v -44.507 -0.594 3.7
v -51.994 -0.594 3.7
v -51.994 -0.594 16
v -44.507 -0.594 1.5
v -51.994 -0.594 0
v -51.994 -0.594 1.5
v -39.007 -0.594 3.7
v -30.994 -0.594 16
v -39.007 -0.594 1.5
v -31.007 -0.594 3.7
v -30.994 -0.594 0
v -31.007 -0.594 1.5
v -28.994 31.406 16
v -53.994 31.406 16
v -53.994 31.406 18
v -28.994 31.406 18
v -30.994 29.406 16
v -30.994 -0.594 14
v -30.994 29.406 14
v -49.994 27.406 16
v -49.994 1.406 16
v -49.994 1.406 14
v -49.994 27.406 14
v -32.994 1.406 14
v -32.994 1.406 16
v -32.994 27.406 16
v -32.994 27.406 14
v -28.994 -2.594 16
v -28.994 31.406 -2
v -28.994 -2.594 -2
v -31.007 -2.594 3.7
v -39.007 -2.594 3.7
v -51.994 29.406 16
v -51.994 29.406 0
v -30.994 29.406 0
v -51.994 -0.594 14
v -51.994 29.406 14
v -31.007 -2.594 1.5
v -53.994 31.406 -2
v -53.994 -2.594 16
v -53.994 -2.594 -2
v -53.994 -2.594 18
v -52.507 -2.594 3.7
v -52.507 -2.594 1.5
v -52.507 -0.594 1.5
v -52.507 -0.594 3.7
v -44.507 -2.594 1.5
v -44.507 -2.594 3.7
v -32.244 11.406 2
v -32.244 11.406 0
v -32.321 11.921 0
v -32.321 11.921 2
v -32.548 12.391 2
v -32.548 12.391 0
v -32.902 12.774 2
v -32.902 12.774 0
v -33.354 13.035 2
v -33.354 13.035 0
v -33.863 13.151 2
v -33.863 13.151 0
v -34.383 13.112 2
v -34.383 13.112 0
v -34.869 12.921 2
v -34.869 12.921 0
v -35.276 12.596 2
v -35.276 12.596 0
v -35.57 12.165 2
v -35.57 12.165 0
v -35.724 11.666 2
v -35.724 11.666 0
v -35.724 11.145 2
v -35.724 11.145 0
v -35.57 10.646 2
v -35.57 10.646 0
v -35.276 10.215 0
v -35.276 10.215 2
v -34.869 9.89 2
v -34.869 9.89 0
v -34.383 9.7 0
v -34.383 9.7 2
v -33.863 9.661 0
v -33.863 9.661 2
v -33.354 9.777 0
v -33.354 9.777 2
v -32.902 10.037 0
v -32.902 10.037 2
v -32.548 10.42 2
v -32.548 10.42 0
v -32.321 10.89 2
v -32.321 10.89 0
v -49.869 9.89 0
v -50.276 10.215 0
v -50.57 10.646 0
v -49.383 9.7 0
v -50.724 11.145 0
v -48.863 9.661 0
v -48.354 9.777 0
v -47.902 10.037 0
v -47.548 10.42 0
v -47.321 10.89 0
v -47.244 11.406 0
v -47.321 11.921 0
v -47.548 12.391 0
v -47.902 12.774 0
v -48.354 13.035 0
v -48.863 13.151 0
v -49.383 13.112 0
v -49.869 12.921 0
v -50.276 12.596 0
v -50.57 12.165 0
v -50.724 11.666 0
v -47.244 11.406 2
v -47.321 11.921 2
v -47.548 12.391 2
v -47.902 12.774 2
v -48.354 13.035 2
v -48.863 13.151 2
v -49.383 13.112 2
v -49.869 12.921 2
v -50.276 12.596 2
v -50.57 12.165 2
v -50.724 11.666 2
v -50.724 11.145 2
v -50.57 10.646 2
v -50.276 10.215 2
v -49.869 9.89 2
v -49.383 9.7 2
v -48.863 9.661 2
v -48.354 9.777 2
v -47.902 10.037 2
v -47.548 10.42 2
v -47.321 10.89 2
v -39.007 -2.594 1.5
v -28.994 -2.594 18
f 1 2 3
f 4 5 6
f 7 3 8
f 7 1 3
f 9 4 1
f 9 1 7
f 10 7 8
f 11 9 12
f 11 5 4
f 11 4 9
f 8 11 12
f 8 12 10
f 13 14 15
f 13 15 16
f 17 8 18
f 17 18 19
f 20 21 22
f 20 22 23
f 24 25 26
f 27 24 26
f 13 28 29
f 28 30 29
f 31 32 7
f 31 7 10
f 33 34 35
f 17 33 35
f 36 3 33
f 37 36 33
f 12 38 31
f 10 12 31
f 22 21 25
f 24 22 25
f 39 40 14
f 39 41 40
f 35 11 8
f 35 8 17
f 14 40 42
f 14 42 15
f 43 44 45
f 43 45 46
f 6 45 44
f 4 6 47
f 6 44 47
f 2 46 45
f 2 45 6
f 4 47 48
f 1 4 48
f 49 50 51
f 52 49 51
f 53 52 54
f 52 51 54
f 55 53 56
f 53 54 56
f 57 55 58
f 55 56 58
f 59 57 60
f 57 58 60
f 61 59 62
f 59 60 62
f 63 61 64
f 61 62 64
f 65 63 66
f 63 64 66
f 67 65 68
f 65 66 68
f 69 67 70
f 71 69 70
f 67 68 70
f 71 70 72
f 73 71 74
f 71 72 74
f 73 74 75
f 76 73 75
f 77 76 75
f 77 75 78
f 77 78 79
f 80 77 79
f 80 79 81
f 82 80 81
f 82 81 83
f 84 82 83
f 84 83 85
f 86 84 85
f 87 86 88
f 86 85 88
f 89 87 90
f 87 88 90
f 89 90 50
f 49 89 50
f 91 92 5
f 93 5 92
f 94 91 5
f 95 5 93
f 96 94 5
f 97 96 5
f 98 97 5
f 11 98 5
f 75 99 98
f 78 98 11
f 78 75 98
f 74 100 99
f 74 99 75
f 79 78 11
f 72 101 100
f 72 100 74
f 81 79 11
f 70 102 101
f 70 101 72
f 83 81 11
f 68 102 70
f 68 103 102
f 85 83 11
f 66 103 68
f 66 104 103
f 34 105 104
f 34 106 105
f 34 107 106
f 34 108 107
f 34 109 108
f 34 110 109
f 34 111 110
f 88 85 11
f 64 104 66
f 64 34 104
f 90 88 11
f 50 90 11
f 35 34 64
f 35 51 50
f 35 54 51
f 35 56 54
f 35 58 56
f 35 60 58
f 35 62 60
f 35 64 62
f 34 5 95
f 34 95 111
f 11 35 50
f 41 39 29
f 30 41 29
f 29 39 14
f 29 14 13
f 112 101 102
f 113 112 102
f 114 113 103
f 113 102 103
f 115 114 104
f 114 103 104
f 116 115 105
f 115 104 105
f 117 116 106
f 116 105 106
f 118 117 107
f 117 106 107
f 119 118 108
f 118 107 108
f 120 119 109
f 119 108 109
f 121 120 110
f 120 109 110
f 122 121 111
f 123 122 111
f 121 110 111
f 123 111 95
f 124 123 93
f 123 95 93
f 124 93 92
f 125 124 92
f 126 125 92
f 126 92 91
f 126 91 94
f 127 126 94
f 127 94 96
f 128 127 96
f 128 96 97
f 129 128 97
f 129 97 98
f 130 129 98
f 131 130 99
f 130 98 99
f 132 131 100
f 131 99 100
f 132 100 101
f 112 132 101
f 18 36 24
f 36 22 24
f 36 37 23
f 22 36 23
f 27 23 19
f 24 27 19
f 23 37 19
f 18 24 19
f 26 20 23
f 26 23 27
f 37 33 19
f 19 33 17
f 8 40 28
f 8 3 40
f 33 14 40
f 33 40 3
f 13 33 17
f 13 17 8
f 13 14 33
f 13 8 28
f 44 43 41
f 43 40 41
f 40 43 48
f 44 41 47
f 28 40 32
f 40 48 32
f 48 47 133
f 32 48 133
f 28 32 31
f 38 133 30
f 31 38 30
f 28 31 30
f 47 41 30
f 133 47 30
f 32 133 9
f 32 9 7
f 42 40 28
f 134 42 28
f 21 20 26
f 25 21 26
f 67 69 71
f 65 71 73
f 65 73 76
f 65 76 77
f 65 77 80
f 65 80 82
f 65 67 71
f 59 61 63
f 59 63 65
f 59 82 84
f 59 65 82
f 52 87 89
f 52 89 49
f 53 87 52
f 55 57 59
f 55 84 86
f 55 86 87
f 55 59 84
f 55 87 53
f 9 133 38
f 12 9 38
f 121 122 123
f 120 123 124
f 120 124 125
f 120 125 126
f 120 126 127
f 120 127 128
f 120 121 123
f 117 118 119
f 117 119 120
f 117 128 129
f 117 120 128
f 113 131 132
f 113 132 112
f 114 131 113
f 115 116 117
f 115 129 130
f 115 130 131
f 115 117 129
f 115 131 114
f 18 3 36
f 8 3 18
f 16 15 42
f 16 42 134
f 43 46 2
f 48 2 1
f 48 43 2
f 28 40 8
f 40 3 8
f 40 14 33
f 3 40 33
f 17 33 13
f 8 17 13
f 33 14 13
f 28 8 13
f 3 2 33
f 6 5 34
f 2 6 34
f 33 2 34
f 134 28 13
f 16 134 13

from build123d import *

# Parameters (mm, degrees)
F0_W      = 25
F0_H      = 34
F1_DEPTH  = 2
F2_W      = 25
F2_H      = 34
F2_W_2    = 21
F2_H_2    = 30
F3_DEPTH  = 16
F4_W      = 8
F4_H      = 2.2
F5_DEPTH  = 2
F6_R      = 1.75
F7_DEPTH  = 2
F8_W      = 25
F8_H      = 34
F8_W_2    = 21
F8_H_2    = 30
F9_DEPTH  = 2
F10_W     = 21
F10_H     = 30
F10_W_2   = 17
F10_H_2   = 26
F11_DEPTH = 4


with BuildPart() as f1:
    # F0 (on Top) → F1 (new body)
    with BuildSketch(Plane.XY):
        with Locations((-41.4935089648, 14.4056526116)):
            Rectangle(F0_W, F0_H)
    extrude(amount=-F1_DEPTH)

    # F2 (on face) → F3 (join)
    with BuildSketch(Plane.XY):
        with Locations((-41.4935089648, 14.4056526116)):
            Rectangle(F2_W, F2_H)
        with Locations((-41.4935089648, 14.4056526116)):
            Rectangle(F2_W_2, F2_H_2, mode=Mode.SUBTRACT)
    extrude(amount=F3_DEPTH)

    # F4 (on face) → F5 (cut)
    with BuildSketch(Plane.XZ.offset(2.5943473884)):
        with Locations((-48.5065041638, 2.6)):
            Rectangle(F4_W, F4_H)
        with Locations((-35.0065041638, 2.6)):
            Rectangle(F4_W, F4_H)
    extrude(amount=-F5_DEPTH, mode=Mode.SUBTRACT)

    # F6 (on face) → F7 (join)
    with BuildSketch(Plane.XY):
        with Locations((-48.9935089648, 11.4056526116)):
            Circle(F6_R)
        with Locations((-33.9935089648, 11.4056526116)):
            Circle(F6_R)
    extrude(amount=F7_DEPTH)


with BuildPart() as f9:
    # F8 (on face) → F9 (new body)
    with BuildSketch(Plane.XY.offset(16)):
        with Locations((-41.4935089648, 14.4056526116)):
            Rectangle(F8_W, F8_H)
        with Locations((-41.4935089648, 14.4056526116)):
            Rectangle(F8_W_2, F8_H_2, mode=Mode.SUBTRACT)
        with Locations((-41.4935089648, 14.4056526116)):
            Rectangle(F8_W_2, F8_H_2)
    extrude(amount=F9_DEPTH)

    # F10 (on face) → F11 (join)
    with BuildSketch(Plane.XY.offset(18)):
        with Locations((-41.4935089648, 14.4056526116)):
            Rectangle(F10_W, F10_H)
        with Locations((-41.4935089648, 14.4056526116)):
            Rectangle(F10_W_2, F10_H_2, mode=Mode.SUBTRACT)
    extrude(amount=-F11_DEPTH)


solid = Compound([f1.part, f9.part])
